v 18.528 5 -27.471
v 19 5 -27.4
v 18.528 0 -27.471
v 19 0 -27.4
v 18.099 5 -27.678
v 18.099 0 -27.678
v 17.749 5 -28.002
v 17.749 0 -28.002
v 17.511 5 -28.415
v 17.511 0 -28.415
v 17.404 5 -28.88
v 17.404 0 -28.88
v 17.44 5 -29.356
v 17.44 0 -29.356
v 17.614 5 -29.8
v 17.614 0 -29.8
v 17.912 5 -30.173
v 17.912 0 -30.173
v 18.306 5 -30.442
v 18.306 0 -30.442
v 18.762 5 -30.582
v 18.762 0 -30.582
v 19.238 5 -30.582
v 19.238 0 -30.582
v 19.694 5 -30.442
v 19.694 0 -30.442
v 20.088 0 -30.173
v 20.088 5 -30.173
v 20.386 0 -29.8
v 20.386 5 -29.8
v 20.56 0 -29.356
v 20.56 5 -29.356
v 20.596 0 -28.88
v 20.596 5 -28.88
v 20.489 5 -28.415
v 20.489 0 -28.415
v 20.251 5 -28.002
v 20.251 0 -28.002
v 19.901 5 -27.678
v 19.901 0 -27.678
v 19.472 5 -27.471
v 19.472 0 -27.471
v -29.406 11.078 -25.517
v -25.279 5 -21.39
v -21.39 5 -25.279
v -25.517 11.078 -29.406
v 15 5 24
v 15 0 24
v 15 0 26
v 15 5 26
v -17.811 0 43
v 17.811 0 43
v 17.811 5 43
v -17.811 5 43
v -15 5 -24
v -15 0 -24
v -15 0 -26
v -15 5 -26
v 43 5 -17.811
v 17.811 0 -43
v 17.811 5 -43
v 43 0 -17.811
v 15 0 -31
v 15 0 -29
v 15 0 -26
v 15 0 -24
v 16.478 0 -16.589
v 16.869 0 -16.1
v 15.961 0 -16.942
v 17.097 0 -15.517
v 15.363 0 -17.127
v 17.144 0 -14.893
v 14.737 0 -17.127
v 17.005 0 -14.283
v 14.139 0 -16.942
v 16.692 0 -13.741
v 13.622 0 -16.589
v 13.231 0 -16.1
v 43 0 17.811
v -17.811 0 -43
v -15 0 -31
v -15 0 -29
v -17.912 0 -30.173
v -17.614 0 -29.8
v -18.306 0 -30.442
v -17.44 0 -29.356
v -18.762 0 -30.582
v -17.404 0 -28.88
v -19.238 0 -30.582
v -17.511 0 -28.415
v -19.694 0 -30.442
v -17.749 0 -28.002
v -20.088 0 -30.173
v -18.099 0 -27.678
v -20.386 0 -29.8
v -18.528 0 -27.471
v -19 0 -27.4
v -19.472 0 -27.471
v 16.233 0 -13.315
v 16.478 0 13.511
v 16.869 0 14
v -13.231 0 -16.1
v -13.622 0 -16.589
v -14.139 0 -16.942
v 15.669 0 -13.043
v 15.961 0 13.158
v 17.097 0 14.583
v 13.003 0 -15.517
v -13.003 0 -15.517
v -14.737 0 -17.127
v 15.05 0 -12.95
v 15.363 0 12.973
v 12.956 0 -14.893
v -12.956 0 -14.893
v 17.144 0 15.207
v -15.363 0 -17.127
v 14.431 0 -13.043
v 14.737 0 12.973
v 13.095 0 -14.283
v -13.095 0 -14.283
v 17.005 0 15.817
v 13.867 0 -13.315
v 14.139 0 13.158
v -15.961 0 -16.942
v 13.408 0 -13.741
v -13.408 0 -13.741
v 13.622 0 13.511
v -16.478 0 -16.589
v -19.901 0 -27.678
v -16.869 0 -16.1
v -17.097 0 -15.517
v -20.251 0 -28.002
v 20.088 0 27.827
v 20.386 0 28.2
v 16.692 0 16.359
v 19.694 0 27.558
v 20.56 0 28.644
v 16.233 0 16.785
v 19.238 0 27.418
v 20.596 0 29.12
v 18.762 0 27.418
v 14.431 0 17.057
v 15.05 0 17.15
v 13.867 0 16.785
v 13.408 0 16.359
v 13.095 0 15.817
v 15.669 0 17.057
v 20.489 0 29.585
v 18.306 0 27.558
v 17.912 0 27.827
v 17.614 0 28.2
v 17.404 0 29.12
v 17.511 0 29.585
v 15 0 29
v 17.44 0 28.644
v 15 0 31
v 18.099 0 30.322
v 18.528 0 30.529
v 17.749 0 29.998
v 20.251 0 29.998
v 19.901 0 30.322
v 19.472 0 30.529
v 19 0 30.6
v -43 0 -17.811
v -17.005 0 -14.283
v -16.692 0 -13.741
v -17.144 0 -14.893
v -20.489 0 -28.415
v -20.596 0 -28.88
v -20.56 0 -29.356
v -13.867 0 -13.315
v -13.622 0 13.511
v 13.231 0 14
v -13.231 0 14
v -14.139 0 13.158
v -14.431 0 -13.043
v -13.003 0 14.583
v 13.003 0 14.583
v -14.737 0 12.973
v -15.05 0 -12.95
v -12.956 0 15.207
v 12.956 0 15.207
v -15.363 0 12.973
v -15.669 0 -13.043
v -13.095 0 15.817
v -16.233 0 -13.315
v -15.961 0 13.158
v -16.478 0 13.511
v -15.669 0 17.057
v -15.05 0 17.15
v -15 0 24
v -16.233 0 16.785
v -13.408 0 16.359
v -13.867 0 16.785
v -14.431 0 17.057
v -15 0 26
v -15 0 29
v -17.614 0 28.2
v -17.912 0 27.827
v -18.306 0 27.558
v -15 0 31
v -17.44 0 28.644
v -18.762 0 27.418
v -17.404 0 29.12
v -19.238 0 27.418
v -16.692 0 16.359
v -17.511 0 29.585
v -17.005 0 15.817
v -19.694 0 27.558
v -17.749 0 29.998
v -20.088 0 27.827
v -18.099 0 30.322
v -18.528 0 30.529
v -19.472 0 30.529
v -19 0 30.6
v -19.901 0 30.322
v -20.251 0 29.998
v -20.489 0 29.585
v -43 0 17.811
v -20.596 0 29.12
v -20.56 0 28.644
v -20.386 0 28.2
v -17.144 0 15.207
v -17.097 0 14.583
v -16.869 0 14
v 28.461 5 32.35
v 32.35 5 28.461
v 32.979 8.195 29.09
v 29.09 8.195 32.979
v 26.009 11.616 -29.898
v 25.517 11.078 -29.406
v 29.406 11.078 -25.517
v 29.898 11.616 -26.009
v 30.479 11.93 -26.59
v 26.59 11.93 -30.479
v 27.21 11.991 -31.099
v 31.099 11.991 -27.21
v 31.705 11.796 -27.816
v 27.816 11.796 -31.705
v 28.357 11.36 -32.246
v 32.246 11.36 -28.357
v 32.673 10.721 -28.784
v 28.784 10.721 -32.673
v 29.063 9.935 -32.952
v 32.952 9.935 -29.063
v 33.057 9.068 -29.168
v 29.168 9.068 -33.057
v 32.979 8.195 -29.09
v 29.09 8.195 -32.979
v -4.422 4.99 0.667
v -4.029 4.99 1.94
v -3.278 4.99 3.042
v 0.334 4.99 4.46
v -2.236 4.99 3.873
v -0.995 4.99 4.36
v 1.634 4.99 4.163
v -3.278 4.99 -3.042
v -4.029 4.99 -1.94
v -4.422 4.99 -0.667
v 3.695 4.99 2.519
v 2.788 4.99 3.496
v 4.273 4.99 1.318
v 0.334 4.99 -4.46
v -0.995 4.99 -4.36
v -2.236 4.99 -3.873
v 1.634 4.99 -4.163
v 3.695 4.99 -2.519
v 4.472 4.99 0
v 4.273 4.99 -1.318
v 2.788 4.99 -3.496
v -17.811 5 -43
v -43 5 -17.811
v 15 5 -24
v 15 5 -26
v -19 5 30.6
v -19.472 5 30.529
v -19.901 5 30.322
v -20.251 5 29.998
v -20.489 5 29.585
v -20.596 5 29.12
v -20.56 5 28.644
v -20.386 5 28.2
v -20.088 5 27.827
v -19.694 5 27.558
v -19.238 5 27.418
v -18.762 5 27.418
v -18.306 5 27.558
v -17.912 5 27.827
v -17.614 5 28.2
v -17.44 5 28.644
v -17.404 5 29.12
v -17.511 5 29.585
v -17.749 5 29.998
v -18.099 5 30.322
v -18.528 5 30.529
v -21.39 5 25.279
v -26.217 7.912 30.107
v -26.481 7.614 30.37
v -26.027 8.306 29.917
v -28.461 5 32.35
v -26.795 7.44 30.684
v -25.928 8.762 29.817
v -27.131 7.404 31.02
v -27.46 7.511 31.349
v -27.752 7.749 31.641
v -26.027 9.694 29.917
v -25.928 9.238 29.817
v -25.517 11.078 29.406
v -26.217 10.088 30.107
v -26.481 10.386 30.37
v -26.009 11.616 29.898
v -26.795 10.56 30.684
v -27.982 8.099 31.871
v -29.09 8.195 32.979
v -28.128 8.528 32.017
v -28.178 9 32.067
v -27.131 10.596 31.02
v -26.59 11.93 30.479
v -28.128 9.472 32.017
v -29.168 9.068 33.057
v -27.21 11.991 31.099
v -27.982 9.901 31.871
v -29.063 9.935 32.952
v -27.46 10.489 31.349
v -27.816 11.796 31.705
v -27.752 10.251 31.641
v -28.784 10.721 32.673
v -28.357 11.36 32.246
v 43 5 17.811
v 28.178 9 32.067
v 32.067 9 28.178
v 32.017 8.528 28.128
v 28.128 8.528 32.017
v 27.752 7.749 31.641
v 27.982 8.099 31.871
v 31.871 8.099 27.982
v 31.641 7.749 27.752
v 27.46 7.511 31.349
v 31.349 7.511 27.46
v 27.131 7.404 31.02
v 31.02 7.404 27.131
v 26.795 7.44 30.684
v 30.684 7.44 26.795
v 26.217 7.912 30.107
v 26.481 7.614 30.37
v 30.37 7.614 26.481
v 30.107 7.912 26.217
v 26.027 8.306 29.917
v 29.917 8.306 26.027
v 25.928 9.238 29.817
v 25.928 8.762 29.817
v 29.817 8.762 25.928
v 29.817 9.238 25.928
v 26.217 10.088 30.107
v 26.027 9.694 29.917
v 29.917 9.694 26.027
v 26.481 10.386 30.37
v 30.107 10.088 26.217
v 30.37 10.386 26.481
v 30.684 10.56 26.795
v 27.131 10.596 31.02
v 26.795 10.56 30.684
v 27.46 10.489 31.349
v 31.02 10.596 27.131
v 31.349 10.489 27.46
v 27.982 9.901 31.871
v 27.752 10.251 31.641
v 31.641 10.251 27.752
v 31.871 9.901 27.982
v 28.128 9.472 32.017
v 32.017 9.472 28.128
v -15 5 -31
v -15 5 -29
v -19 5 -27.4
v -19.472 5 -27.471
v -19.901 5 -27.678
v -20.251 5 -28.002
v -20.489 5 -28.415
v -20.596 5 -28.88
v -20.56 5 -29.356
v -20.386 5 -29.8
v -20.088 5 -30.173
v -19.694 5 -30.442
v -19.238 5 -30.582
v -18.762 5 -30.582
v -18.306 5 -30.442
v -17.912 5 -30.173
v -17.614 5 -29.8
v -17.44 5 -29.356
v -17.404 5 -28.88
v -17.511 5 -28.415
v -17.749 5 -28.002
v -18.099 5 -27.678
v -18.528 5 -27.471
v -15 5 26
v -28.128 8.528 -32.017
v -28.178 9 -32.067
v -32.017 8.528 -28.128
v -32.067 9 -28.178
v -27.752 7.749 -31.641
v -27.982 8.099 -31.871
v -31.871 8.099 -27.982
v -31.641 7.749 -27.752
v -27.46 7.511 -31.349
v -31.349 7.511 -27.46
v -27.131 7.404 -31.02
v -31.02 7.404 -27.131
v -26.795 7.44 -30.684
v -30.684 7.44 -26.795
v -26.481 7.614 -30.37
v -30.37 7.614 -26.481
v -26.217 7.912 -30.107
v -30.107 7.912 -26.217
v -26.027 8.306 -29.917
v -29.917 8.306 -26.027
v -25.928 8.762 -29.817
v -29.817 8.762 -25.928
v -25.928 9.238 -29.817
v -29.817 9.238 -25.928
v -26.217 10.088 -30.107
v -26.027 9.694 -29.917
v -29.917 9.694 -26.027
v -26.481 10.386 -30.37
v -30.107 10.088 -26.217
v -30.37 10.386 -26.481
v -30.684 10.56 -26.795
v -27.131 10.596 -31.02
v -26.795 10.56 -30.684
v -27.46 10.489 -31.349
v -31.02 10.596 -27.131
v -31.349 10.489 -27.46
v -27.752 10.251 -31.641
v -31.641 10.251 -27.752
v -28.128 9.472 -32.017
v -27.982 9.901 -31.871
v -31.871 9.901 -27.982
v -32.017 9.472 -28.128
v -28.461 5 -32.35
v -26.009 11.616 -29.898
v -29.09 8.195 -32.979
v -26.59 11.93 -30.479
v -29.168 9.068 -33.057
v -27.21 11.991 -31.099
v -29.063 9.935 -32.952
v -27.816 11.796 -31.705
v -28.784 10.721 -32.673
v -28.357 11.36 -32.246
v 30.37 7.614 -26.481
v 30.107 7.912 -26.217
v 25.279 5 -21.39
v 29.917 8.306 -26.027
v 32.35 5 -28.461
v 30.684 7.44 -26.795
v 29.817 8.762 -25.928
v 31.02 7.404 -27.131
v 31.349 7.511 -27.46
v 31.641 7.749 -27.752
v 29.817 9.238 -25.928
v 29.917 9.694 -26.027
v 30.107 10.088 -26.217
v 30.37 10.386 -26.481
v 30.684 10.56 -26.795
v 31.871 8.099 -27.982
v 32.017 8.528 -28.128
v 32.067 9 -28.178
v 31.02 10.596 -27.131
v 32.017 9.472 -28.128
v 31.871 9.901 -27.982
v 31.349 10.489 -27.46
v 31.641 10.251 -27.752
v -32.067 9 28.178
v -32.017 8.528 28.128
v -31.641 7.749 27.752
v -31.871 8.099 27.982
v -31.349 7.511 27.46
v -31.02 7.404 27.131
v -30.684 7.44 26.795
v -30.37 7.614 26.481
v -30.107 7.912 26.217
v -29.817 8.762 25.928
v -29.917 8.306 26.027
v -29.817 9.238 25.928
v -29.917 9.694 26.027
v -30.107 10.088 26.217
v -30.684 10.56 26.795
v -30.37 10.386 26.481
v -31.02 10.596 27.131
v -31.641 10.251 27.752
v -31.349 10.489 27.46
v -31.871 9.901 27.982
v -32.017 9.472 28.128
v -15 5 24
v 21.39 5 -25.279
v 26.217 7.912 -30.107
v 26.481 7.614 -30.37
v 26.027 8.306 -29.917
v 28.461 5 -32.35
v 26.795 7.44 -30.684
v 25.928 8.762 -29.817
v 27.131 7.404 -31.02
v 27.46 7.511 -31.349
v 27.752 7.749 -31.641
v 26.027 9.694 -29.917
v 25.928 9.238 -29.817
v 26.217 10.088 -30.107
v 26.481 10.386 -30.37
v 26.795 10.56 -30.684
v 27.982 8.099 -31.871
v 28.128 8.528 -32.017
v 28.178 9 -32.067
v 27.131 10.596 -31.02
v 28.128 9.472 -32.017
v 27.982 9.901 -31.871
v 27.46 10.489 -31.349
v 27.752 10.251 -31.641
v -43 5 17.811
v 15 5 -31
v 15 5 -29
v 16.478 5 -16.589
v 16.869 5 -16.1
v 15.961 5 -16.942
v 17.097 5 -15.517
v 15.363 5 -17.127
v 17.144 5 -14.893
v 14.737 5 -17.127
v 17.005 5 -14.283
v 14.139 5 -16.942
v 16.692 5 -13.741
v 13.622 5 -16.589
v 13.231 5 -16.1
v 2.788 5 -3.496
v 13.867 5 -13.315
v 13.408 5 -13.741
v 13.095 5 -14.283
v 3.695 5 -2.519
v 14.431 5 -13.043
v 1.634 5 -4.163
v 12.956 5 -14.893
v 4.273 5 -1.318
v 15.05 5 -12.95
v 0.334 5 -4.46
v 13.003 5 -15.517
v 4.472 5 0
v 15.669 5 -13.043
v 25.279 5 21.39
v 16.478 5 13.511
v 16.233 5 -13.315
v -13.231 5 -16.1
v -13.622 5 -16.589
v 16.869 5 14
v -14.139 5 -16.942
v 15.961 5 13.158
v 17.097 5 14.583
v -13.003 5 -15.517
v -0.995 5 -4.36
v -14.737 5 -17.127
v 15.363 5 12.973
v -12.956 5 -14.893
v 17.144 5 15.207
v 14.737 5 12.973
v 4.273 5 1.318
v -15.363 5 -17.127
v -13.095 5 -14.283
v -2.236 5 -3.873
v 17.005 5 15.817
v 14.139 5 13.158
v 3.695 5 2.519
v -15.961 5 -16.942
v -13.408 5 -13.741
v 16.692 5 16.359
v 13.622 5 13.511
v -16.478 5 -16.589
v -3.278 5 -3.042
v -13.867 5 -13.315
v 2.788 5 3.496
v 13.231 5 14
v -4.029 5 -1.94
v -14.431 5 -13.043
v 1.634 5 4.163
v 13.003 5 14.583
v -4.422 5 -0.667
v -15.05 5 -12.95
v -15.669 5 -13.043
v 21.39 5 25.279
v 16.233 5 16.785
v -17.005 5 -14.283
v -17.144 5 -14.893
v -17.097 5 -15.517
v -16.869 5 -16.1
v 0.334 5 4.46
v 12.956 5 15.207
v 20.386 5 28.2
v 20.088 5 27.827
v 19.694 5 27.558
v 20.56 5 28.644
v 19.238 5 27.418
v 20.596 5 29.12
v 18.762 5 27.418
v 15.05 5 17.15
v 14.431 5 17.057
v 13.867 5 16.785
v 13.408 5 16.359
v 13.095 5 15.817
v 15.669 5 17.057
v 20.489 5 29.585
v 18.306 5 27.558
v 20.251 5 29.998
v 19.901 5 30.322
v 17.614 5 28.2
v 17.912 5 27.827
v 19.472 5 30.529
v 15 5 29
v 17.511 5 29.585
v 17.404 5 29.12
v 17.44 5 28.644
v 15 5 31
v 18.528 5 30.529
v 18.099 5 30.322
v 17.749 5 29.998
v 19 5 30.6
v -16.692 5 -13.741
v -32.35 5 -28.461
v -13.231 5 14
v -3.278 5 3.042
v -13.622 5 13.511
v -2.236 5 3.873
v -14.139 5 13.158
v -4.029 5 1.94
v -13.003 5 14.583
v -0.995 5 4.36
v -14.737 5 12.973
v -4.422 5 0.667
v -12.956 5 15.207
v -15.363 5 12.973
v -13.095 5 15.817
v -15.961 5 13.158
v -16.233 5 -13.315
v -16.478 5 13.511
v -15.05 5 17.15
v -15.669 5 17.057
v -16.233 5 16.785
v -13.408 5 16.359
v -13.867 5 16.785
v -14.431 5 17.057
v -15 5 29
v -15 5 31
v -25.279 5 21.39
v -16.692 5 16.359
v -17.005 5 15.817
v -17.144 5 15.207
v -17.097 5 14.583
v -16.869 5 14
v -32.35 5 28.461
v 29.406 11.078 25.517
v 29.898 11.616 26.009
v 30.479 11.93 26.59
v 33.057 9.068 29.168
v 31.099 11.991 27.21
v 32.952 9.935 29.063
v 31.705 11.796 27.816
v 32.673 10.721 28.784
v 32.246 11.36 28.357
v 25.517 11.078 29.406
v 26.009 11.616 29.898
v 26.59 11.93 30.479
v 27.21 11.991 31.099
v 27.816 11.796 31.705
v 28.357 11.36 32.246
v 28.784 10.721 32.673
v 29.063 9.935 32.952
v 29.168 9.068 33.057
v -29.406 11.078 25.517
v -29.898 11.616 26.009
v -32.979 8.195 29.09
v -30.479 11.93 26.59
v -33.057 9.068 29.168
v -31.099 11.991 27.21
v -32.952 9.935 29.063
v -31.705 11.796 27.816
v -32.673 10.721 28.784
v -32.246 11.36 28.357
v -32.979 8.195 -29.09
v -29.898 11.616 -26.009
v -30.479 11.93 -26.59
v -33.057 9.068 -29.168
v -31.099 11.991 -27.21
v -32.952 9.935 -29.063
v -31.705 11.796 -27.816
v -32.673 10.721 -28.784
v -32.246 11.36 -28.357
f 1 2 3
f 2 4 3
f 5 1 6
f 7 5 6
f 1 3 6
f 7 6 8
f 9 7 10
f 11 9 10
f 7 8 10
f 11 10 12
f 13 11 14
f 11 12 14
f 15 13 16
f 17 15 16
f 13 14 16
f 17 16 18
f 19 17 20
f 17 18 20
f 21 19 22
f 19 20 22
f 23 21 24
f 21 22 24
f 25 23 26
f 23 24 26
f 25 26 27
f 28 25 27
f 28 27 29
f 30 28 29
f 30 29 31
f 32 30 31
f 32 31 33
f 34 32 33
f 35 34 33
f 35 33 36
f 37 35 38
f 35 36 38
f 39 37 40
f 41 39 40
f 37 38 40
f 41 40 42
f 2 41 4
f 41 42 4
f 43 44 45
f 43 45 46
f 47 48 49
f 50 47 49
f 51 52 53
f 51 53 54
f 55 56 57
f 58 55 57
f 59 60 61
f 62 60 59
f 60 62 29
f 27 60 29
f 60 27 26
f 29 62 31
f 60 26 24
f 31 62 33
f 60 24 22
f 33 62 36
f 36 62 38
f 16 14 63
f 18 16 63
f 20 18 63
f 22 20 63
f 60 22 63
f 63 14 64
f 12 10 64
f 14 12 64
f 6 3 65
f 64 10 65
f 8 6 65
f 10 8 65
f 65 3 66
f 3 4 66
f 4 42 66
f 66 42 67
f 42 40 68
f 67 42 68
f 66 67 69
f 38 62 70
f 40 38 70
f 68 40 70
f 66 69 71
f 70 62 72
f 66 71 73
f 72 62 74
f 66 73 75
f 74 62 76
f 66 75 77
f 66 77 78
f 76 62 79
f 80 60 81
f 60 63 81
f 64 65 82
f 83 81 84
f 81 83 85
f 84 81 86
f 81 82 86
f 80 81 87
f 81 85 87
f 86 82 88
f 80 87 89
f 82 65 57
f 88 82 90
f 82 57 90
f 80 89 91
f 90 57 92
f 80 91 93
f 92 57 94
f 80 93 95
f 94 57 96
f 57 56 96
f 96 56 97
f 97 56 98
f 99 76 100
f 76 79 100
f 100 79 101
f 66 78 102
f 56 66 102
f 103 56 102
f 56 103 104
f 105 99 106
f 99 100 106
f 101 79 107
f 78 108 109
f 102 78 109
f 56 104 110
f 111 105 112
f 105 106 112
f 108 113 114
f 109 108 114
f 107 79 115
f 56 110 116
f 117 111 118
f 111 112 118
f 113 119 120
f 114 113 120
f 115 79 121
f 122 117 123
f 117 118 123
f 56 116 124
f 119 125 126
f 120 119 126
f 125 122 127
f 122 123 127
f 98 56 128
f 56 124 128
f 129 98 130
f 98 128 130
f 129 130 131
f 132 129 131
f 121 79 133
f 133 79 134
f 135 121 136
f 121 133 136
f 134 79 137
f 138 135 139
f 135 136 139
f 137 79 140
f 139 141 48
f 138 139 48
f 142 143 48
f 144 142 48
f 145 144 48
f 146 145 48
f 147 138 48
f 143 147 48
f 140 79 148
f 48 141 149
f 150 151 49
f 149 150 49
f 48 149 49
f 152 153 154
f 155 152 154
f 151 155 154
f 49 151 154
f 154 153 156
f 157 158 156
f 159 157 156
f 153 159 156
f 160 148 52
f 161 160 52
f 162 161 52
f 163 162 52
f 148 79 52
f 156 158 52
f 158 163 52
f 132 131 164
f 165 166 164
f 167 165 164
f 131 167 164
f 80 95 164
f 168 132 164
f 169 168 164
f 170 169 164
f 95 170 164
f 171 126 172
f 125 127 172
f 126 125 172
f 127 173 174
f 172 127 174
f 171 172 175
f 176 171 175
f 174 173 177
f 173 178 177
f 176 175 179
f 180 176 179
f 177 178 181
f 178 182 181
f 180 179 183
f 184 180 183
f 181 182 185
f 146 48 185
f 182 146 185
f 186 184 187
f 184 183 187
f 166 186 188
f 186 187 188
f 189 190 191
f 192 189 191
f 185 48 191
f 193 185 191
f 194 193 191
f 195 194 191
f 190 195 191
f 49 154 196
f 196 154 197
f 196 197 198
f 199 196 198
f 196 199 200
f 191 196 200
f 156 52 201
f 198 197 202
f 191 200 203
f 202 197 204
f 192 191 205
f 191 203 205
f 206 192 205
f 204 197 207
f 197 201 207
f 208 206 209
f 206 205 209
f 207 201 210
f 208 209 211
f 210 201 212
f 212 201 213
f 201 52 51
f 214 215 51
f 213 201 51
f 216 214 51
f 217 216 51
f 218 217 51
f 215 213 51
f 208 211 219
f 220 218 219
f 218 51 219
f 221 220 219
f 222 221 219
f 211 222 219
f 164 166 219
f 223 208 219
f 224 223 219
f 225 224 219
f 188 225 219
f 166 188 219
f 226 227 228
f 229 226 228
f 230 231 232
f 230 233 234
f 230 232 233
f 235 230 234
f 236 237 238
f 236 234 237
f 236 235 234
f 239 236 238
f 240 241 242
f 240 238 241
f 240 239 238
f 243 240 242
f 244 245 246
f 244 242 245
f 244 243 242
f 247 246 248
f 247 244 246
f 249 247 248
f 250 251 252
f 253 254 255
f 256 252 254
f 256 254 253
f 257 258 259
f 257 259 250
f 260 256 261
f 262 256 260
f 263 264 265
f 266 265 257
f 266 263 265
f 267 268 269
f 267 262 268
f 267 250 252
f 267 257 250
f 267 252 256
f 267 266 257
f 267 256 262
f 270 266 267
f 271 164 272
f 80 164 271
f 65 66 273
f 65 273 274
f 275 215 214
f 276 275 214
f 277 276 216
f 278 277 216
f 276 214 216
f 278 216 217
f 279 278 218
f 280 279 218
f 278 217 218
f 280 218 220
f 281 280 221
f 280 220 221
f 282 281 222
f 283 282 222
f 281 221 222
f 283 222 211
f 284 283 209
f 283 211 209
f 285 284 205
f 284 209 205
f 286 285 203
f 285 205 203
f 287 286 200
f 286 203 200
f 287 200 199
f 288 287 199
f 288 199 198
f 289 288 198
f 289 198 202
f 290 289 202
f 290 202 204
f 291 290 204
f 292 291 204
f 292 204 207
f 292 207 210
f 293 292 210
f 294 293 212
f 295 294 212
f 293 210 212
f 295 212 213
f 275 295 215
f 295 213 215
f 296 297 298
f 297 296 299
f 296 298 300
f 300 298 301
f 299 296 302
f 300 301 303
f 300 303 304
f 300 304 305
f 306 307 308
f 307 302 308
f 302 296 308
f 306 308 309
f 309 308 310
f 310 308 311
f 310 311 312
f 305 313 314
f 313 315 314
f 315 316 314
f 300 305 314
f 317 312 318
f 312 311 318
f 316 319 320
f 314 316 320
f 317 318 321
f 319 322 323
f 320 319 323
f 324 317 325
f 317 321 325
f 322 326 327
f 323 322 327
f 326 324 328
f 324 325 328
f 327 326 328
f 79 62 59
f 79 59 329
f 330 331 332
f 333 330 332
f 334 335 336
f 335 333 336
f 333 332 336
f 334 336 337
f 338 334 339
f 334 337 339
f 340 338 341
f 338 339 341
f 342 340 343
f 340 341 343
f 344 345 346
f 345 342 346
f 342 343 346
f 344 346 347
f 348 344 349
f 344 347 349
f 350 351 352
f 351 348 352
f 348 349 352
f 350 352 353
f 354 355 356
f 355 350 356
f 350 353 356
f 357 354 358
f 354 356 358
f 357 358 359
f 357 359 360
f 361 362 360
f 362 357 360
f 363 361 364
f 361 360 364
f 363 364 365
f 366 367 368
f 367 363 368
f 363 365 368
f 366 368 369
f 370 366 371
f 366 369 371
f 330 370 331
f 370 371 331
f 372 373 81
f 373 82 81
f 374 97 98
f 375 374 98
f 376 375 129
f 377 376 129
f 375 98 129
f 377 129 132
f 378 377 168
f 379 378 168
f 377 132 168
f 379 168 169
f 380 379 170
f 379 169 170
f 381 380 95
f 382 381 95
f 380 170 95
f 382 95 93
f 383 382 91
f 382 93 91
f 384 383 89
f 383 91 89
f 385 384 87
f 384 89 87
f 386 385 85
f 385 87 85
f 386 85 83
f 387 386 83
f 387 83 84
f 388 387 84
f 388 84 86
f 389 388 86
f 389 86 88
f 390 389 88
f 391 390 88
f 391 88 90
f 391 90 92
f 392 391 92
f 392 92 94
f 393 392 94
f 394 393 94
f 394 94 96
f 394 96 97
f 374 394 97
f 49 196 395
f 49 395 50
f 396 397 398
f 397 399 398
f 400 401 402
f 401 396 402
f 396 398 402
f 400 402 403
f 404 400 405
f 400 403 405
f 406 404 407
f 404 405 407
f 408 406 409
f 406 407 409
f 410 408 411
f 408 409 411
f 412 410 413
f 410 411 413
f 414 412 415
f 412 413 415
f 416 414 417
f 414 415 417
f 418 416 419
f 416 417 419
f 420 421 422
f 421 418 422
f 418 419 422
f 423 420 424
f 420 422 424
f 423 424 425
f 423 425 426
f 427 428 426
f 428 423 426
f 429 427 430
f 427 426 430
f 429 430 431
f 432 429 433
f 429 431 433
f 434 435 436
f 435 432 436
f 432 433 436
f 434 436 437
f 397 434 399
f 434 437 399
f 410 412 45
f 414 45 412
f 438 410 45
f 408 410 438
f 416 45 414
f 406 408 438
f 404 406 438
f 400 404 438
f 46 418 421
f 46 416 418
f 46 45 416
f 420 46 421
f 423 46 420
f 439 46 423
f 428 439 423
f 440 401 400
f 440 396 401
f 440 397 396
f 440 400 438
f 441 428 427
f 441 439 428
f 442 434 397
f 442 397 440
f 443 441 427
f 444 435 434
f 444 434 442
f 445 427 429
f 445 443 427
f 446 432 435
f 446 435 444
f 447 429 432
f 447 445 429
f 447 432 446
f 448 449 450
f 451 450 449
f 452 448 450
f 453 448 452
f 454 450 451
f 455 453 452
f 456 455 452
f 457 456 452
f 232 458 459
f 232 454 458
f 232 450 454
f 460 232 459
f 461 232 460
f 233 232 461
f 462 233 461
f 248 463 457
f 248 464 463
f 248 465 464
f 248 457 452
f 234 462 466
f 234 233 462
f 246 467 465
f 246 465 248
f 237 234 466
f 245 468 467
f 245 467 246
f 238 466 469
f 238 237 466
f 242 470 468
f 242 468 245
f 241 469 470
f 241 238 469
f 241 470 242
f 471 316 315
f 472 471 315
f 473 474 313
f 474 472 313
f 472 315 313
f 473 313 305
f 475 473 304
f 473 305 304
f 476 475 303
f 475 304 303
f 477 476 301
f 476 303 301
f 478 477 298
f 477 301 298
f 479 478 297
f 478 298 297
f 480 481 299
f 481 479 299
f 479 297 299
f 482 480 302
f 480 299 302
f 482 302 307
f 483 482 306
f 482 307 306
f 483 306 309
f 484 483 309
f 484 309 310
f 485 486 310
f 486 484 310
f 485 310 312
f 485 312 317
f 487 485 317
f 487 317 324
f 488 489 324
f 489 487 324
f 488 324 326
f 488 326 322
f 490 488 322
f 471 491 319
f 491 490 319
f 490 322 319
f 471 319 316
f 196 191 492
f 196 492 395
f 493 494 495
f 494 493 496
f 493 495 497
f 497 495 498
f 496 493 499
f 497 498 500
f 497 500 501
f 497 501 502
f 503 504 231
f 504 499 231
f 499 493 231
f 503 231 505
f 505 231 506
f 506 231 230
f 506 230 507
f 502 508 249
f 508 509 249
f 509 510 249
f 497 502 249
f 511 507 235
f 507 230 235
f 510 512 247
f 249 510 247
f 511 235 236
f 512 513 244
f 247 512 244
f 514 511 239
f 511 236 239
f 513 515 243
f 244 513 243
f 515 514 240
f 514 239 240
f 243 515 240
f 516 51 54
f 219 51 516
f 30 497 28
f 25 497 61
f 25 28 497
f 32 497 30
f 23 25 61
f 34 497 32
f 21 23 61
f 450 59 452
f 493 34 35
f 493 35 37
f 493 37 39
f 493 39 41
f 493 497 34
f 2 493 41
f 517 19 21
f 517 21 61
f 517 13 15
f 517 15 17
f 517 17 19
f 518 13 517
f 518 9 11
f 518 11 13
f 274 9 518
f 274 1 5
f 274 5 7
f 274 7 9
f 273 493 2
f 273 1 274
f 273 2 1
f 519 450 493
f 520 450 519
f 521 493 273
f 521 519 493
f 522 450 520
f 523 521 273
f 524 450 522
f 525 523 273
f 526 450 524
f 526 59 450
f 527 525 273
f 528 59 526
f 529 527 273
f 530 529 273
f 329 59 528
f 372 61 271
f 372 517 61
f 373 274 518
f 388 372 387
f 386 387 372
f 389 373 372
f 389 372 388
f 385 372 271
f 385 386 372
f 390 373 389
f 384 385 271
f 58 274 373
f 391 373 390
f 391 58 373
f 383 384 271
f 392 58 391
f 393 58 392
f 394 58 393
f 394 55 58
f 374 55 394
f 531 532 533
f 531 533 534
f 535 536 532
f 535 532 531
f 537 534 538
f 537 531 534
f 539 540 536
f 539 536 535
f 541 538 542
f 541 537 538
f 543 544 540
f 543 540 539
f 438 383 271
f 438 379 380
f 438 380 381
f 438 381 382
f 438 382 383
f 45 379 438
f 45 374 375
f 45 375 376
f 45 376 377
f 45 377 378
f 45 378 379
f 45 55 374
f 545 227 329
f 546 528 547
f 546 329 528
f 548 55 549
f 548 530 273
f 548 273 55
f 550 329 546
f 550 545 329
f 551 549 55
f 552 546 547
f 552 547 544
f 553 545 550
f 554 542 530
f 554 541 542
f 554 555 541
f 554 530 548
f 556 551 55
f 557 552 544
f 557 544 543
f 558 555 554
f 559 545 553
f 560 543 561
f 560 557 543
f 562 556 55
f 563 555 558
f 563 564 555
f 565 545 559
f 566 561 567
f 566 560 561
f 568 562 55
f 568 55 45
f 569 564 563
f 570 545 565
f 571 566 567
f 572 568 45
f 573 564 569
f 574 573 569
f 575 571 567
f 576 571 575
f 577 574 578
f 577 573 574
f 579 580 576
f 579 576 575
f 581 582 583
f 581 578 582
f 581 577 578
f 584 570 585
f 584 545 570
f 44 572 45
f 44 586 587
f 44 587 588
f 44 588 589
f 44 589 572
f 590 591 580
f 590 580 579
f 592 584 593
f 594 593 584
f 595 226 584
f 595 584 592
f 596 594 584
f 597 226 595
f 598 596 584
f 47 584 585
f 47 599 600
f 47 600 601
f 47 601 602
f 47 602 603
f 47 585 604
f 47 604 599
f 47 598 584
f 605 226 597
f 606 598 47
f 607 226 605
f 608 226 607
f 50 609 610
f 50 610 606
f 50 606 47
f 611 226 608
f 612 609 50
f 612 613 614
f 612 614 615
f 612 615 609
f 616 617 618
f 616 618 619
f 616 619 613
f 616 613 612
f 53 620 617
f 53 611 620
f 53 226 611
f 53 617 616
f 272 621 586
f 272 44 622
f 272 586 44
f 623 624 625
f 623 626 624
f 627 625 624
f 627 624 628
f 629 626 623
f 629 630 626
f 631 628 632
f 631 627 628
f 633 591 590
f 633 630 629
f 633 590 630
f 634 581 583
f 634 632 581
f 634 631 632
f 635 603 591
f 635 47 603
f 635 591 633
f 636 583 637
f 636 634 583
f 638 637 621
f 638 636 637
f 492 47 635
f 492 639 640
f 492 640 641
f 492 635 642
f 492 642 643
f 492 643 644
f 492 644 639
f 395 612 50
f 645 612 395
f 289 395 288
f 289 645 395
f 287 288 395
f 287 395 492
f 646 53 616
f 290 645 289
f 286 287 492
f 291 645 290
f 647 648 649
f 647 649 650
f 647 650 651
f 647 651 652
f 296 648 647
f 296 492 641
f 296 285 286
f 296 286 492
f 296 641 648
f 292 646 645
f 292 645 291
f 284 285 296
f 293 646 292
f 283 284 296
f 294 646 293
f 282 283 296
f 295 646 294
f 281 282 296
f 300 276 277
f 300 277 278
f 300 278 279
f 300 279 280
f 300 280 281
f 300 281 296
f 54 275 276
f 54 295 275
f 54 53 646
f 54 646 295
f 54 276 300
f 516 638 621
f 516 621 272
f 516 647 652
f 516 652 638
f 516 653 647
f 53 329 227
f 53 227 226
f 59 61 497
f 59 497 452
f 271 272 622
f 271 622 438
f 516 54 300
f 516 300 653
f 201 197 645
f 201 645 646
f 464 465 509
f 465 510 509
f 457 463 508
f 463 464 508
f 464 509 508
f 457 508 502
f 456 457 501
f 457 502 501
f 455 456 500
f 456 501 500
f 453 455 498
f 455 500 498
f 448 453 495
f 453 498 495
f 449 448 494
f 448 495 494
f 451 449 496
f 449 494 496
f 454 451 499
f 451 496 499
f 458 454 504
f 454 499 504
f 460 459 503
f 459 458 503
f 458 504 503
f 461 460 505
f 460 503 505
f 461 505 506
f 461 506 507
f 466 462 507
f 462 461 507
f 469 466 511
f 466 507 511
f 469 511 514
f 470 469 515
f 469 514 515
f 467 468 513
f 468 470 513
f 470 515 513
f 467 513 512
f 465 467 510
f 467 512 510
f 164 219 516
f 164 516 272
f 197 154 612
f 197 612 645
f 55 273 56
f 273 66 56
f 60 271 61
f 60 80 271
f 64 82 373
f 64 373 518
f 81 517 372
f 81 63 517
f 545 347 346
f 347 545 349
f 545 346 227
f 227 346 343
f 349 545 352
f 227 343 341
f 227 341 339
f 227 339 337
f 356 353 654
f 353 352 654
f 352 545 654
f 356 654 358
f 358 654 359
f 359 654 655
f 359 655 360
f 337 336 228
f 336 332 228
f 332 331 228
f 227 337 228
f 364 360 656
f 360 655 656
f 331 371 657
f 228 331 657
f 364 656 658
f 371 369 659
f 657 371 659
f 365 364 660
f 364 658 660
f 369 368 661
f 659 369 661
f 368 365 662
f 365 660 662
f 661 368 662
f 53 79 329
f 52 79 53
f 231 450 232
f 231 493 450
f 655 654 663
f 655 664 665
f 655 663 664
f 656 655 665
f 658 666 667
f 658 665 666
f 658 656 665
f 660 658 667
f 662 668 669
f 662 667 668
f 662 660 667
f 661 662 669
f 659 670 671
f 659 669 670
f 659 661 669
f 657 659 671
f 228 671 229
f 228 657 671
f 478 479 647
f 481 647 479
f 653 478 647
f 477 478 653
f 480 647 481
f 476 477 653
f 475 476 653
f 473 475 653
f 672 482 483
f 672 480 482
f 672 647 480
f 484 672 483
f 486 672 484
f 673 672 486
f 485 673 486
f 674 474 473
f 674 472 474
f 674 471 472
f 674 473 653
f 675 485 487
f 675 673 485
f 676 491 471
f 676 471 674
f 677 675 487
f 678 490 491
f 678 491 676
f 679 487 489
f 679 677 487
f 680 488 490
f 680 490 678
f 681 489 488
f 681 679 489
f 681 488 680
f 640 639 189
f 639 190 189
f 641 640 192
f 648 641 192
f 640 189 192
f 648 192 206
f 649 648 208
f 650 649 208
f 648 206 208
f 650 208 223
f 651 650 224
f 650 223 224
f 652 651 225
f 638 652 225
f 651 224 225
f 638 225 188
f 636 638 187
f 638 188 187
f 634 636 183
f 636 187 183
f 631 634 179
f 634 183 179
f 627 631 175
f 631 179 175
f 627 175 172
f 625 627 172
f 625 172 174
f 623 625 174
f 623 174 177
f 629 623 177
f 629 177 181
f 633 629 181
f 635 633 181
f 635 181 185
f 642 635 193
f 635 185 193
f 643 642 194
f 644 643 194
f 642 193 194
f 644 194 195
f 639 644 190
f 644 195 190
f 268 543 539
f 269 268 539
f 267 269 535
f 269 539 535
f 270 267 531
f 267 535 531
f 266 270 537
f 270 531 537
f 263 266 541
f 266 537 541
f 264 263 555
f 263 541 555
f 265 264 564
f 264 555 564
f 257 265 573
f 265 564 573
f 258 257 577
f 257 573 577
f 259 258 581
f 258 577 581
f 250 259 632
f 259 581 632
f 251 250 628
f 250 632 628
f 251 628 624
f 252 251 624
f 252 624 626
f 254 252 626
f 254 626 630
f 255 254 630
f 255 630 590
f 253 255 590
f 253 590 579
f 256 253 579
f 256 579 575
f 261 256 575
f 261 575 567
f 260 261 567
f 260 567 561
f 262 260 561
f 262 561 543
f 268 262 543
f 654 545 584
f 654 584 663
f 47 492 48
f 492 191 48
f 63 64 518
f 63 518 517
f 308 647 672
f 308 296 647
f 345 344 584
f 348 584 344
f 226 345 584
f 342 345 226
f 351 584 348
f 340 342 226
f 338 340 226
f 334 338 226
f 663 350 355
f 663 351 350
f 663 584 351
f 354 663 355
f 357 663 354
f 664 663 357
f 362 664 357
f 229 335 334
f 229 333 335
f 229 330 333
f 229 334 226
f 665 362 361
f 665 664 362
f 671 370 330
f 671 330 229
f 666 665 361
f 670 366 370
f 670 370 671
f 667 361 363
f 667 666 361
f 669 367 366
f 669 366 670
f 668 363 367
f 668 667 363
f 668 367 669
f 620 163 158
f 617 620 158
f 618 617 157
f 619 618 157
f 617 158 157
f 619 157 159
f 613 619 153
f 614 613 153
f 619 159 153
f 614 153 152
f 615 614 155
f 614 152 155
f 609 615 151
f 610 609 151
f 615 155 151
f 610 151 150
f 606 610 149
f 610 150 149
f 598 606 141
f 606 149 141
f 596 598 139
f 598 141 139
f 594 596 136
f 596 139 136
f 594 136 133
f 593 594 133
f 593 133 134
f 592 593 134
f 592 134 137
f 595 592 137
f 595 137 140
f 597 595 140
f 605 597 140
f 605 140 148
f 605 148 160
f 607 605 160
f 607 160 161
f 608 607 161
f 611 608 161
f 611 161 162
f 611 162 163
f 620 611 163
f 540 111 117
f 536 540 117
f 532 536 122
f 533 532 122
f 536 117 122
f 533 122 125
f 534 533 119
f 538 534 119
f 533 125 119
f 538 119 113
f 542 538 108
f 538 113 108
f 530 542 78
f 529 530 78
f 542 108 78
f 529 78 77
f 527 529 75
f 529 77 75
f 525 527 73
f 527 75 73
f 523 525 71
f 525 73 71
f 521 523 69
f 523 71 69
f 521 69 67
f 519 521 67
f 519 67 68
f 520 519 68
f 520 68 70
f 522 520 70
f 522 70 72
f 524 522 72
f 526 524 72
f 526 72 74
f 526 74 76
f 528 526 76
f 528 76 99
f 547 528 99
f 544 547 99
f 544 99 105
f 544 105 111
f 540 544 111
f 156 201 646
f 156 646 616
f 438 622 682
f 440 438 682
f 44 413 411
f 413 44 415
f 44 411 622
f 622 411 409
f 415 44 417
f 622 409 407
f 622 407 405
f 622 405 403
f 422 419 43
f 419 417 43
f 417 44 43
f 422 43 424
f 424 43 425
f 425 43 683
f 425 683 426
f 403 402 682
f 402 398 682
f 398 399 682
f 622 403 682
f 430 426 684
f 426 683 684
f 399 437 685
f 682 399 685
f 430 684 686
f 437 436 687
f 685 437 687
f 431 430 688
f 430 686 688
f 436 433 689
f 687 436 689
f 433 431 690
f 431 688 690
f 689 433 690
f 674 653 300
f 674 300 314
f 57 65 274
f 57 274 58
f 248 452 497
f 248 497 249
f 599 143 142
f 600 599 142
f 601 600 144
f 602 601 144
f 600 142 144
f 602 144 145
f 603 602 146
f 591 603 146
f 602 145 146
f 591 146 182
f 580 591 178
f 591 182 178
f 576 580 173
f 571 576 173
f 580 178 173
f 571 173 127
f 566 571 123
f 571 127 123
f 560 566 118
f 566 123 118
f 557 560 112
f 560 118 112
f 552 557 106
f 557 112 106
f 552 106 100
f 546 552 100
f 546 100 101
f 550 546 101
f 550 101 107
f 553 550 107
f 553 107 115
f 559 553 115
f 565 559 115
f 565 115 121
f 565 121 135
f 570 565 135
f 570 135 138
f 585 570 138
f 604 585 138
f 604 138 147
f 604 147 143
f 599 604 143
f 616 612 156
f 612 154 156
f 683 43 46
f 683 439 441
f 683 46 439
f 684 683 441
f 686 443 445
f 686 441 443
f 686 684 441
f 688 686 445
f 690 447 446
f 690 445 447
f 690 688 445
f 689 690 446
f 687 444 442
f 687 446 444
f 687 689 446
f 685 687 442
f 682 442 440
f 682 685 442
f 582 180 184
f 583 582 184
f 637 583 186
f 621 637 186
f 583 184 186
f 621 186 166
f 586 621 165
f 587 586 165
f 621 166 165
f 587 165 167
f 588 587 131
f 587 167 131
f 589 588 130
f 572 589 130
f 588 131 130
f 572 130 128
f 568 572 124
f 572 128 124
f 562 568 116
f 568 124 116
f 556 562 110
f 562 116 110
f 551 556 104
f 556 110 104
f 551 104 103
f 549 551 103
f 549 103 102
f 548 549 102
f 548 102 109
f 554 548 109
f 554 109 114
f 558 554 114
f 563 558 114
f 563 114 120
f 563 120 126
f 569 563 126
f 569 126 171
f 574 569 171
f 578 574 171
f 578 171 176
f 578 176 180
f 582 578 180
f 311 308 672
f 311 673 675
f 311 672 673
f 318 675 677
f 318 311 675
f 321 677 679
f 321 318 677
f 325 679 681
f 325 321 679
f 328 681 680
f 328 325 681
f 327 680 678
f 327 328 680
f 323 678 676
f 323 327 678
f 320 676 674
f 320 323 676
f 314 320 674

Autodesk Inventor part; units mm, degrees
ref_plane "YZ Plane" through (0, 0, 0) normal (1, 0, 0) x (0, 1, 0)
ref_plane "XZ Plane" through (0, 0, 0) normal (0, 1, 0) x (-1, 0, 0)
sketch "Sketch1" plane through (0, 0, 0) normal (0, 1, 0) x (-1, 0, 0)
  line L0 (17.8112, 43) -> (43, 17.8112)
  line L1 (43, 17.8112) -> (43, -17.8112)
  line L2 (43, -17.8112) -> (17.8112, -43)
  line L3 (17.8112, -43) -> (-17.8112, -43)
  line L4 (-17.8112, -43) -> (-43, -17.8112)
  line L5 (-43, -17.8112) -> (-43, 17.8112)
  line L6 (-43, 17.8112) -> (-17.8112, 43)
  line L7 (-17.8112, 43) -> (17.8112, 43)
  point P0 (0, 0)
  point P1 (0, 0)
  point P2 (0, 43)
  dimension "d0" = 86
extrude "Extrusion1" add sketch "Sketch1" along normal blind 5
sketch "Sketch3" plane through (0, 0, 0) normal (0, -1, 0) x (1, 0, 0)
  line L0 (43, 17.8112) -> (43, -17.8112) projected
  line L1 (-15, 24) -> (-15, 26)
  line L2 (-15, 26) -> (0, 26)
  line L3 (0, 29) -> (-15, 29)
  line L4 (-15, 29) -> (-15, 31)
  line L5 (-15, 31) -> (0, 31)
  line L6 (0, 0) -> (0, 24) construction
  line L7 (0, 0) -> (-3.3479, 0) construction
  line L8 (0, 24) -> (-15, 24)
  line L9 (15, 24) -> (15, 26)
  line L10 (15, 26) -> (0, 26)
  line L11 (0, 29) -> (15, 29)
  line L12 (15, 29) -> (15, 31)
  line L13 (15, 31) -> (0, 31)
  line L14 (0, 24) -> (15, 24)
  line L15 (-15, -24) -> (-15, -26)
  line L16 (-15, -26) -> (0, -26)
  line L17 (0, -29) -> (-15, -29)
  line L18 (-15, -29) -> (-15, -31)
  line L19 (-15, -31) -> (0, -31)
  line L20 (0, -24) -> (-15, -24)
  line L21 (15, -24) -> (15, -26)
  line L22 (15, -26) -> (0, -26)
  line L23 (0, -29) -> (15, -29)
  line L24 (15, -29) -> (15, -31)
  line L25 (15, -31) -> (0, -31)
  line L26 (0, -24) -> (15, -24)
  line L27 (-17.8112, 43) -> (17.8112, 43) projected
  point P0 (11.5, 17.5)
  point P1 (-15, 25)
  point P2 (-7.5, 24)
  point P3 (15, 25)
  point P4 (7.5, 24)
  point P5 (11.5, -17.5)
  point P6 (-15, -25)
  point P7 (-7.5, -24)
  point P8 (15, -25)
  point P9 (7.5, -24)
  point P10 (0, 43)
  dimension "d21" = 2
  dimension "d22" = 3
  dimension "d23" = 2
  dimension "d25" = 15
  dimension "d30" = 12
extrude "Extrusion3" cut sketch "Sketch3" against normal blind 5
sketch "Sketch4" plane through (0, 5, 0) normal (0, 1, 0) x (1, 0, 0)
  circle A0 centre (0, 0) radius 4.4721
extrude "Extrusion4" cut sketch "Sketch4" against normal blind 0.01
ref_plane "Work Plane1" through (12.5944, 0, 12.5944) normal (-0.7071, 0, 0.7071) x (0.7071, 0, 0.7071)
sketch "Sketch5" plane through (12.5944, 0, 12.5944) normal (-0.7071, 0, 0.7071) x (0.7071, 0, 0.7071)
  line L0 (25.1888, 5) -> (19.1888, 5)
  line L1 (25.1888, 5) -> (0, 5)
  line L2 (19.1888, 5) -> (19.1888, 9) construction
  line L3 (19.1888, 9) -> (23.1888, 9) construction
  circle A0 centre (23.1888, 9) radius 3
  circle A1 centre (23.1888, 9) radius 1.6
  line L4 (25.1888, 5) -> (26.0788, 8.195)
  line L5 (15.1888, 5) -> (21.0249, 11.0778)
  line L6 (15.1888, 5) -> (19.1888, 5)
  line L7 (19.1888, 9.1657) -> (18.1888, 5)
  point P0 (-17.8112, 0)
  point P1 (-17.8112, 0)
  point P2 (-107.2923, -20.1826)
  point P3 (-107.2923, -23.1826)
  point P4 (15.1888, 5)
  dimension "d33" = 6
  dimension "d34" = 4
  dimension "d35" = 4
  dimension "d36" = 6
  dimension "d37" = 3.2
  dimension "d38" = 10
  dimension "d39" = 1
extrude "Extrusion5" add sketch "Sketch5" along normal mid plane 5.5
pattern_circular "Circular Pattern2" count 4 over 360 about axis through (0, 5, 0) along (0, -1, 0) of "Extrusion5"
sketch "Sketch6" plane through (0, 5, 0) normal (0, 1, 0) x (1, 0, 0)
  line L0 (0, 0) -> (30.1227, 30.1227) construction
  line L1 (32.0673, 28.1782) -> (28.1782, 32.0673) construction
  line L2 (-15.05, -15.05) -> (15.05, -15.05) construction
  line L3 (15.05, -15.05) -> (15.05, 15.05) construction
  line L4 (15.05, 15.05) -> (-15.05, 15.05) construction
  line L5 (-15.05, 15.05) -> (-15.05, -15.05) construction
  line L6 (-15.05, -15.05) -> (15.05, 15.05) construction
  line L7 (15.05, -15.05) -> (-15.05, 15.05) construction
  dimension "d45" = 30.1
  dimension "d46" = 30.1
hole "Hole1" at (-15.05, 5, -15.05) at (-15.05, 5, 15.05) at (15.05, 5, -15.05) at (15.05, 5, 15.05) direction (0, -1, 0) diameter 4.2 end through all
sketch "Sketch7" plane through (0, 5, 0) normal (0, 1, 0) x (1, 0, 0)
  line L0 (-18, -18) -> (18, -18) construction
  line L1 (18, -18) -> (18, 18) construction
  line L2 (18, 18) -> (-18, 18) construction
  line L3 (-18, 18) -> (-18, -18) construction
  line L4 (-18, -18) -> (18, 18) construction
  line L5 (18, -18) -> (-18, 18) construction
  line L6 (-19, -29) -> (19, -29) construction
  line L7 (19, -29) -> (19, 29) construction
  line L8 (19, 29) -> (-19, 29) construction
  line L9 (-19, 29) -> (-19, -29) construction
  circle A0 centre (0, 0) radius 4.4721 construction
  line L10 (-19, -29) -> (19, 29) construction
  line L11 (19, -29) -> (-19, 29) construction
  dimension "d59" = 36
  dimension "d60" = 36
  dimension "d61" = 58
  dimension "d62" = 38
hole "Hole2" at (-19, 5, -29) at (19, 5, -29) at (19, 5, 29) at (-19, 5, 29) direction (0, -1, 0) diameter 3.2 end through all
properties part number "bottom"
